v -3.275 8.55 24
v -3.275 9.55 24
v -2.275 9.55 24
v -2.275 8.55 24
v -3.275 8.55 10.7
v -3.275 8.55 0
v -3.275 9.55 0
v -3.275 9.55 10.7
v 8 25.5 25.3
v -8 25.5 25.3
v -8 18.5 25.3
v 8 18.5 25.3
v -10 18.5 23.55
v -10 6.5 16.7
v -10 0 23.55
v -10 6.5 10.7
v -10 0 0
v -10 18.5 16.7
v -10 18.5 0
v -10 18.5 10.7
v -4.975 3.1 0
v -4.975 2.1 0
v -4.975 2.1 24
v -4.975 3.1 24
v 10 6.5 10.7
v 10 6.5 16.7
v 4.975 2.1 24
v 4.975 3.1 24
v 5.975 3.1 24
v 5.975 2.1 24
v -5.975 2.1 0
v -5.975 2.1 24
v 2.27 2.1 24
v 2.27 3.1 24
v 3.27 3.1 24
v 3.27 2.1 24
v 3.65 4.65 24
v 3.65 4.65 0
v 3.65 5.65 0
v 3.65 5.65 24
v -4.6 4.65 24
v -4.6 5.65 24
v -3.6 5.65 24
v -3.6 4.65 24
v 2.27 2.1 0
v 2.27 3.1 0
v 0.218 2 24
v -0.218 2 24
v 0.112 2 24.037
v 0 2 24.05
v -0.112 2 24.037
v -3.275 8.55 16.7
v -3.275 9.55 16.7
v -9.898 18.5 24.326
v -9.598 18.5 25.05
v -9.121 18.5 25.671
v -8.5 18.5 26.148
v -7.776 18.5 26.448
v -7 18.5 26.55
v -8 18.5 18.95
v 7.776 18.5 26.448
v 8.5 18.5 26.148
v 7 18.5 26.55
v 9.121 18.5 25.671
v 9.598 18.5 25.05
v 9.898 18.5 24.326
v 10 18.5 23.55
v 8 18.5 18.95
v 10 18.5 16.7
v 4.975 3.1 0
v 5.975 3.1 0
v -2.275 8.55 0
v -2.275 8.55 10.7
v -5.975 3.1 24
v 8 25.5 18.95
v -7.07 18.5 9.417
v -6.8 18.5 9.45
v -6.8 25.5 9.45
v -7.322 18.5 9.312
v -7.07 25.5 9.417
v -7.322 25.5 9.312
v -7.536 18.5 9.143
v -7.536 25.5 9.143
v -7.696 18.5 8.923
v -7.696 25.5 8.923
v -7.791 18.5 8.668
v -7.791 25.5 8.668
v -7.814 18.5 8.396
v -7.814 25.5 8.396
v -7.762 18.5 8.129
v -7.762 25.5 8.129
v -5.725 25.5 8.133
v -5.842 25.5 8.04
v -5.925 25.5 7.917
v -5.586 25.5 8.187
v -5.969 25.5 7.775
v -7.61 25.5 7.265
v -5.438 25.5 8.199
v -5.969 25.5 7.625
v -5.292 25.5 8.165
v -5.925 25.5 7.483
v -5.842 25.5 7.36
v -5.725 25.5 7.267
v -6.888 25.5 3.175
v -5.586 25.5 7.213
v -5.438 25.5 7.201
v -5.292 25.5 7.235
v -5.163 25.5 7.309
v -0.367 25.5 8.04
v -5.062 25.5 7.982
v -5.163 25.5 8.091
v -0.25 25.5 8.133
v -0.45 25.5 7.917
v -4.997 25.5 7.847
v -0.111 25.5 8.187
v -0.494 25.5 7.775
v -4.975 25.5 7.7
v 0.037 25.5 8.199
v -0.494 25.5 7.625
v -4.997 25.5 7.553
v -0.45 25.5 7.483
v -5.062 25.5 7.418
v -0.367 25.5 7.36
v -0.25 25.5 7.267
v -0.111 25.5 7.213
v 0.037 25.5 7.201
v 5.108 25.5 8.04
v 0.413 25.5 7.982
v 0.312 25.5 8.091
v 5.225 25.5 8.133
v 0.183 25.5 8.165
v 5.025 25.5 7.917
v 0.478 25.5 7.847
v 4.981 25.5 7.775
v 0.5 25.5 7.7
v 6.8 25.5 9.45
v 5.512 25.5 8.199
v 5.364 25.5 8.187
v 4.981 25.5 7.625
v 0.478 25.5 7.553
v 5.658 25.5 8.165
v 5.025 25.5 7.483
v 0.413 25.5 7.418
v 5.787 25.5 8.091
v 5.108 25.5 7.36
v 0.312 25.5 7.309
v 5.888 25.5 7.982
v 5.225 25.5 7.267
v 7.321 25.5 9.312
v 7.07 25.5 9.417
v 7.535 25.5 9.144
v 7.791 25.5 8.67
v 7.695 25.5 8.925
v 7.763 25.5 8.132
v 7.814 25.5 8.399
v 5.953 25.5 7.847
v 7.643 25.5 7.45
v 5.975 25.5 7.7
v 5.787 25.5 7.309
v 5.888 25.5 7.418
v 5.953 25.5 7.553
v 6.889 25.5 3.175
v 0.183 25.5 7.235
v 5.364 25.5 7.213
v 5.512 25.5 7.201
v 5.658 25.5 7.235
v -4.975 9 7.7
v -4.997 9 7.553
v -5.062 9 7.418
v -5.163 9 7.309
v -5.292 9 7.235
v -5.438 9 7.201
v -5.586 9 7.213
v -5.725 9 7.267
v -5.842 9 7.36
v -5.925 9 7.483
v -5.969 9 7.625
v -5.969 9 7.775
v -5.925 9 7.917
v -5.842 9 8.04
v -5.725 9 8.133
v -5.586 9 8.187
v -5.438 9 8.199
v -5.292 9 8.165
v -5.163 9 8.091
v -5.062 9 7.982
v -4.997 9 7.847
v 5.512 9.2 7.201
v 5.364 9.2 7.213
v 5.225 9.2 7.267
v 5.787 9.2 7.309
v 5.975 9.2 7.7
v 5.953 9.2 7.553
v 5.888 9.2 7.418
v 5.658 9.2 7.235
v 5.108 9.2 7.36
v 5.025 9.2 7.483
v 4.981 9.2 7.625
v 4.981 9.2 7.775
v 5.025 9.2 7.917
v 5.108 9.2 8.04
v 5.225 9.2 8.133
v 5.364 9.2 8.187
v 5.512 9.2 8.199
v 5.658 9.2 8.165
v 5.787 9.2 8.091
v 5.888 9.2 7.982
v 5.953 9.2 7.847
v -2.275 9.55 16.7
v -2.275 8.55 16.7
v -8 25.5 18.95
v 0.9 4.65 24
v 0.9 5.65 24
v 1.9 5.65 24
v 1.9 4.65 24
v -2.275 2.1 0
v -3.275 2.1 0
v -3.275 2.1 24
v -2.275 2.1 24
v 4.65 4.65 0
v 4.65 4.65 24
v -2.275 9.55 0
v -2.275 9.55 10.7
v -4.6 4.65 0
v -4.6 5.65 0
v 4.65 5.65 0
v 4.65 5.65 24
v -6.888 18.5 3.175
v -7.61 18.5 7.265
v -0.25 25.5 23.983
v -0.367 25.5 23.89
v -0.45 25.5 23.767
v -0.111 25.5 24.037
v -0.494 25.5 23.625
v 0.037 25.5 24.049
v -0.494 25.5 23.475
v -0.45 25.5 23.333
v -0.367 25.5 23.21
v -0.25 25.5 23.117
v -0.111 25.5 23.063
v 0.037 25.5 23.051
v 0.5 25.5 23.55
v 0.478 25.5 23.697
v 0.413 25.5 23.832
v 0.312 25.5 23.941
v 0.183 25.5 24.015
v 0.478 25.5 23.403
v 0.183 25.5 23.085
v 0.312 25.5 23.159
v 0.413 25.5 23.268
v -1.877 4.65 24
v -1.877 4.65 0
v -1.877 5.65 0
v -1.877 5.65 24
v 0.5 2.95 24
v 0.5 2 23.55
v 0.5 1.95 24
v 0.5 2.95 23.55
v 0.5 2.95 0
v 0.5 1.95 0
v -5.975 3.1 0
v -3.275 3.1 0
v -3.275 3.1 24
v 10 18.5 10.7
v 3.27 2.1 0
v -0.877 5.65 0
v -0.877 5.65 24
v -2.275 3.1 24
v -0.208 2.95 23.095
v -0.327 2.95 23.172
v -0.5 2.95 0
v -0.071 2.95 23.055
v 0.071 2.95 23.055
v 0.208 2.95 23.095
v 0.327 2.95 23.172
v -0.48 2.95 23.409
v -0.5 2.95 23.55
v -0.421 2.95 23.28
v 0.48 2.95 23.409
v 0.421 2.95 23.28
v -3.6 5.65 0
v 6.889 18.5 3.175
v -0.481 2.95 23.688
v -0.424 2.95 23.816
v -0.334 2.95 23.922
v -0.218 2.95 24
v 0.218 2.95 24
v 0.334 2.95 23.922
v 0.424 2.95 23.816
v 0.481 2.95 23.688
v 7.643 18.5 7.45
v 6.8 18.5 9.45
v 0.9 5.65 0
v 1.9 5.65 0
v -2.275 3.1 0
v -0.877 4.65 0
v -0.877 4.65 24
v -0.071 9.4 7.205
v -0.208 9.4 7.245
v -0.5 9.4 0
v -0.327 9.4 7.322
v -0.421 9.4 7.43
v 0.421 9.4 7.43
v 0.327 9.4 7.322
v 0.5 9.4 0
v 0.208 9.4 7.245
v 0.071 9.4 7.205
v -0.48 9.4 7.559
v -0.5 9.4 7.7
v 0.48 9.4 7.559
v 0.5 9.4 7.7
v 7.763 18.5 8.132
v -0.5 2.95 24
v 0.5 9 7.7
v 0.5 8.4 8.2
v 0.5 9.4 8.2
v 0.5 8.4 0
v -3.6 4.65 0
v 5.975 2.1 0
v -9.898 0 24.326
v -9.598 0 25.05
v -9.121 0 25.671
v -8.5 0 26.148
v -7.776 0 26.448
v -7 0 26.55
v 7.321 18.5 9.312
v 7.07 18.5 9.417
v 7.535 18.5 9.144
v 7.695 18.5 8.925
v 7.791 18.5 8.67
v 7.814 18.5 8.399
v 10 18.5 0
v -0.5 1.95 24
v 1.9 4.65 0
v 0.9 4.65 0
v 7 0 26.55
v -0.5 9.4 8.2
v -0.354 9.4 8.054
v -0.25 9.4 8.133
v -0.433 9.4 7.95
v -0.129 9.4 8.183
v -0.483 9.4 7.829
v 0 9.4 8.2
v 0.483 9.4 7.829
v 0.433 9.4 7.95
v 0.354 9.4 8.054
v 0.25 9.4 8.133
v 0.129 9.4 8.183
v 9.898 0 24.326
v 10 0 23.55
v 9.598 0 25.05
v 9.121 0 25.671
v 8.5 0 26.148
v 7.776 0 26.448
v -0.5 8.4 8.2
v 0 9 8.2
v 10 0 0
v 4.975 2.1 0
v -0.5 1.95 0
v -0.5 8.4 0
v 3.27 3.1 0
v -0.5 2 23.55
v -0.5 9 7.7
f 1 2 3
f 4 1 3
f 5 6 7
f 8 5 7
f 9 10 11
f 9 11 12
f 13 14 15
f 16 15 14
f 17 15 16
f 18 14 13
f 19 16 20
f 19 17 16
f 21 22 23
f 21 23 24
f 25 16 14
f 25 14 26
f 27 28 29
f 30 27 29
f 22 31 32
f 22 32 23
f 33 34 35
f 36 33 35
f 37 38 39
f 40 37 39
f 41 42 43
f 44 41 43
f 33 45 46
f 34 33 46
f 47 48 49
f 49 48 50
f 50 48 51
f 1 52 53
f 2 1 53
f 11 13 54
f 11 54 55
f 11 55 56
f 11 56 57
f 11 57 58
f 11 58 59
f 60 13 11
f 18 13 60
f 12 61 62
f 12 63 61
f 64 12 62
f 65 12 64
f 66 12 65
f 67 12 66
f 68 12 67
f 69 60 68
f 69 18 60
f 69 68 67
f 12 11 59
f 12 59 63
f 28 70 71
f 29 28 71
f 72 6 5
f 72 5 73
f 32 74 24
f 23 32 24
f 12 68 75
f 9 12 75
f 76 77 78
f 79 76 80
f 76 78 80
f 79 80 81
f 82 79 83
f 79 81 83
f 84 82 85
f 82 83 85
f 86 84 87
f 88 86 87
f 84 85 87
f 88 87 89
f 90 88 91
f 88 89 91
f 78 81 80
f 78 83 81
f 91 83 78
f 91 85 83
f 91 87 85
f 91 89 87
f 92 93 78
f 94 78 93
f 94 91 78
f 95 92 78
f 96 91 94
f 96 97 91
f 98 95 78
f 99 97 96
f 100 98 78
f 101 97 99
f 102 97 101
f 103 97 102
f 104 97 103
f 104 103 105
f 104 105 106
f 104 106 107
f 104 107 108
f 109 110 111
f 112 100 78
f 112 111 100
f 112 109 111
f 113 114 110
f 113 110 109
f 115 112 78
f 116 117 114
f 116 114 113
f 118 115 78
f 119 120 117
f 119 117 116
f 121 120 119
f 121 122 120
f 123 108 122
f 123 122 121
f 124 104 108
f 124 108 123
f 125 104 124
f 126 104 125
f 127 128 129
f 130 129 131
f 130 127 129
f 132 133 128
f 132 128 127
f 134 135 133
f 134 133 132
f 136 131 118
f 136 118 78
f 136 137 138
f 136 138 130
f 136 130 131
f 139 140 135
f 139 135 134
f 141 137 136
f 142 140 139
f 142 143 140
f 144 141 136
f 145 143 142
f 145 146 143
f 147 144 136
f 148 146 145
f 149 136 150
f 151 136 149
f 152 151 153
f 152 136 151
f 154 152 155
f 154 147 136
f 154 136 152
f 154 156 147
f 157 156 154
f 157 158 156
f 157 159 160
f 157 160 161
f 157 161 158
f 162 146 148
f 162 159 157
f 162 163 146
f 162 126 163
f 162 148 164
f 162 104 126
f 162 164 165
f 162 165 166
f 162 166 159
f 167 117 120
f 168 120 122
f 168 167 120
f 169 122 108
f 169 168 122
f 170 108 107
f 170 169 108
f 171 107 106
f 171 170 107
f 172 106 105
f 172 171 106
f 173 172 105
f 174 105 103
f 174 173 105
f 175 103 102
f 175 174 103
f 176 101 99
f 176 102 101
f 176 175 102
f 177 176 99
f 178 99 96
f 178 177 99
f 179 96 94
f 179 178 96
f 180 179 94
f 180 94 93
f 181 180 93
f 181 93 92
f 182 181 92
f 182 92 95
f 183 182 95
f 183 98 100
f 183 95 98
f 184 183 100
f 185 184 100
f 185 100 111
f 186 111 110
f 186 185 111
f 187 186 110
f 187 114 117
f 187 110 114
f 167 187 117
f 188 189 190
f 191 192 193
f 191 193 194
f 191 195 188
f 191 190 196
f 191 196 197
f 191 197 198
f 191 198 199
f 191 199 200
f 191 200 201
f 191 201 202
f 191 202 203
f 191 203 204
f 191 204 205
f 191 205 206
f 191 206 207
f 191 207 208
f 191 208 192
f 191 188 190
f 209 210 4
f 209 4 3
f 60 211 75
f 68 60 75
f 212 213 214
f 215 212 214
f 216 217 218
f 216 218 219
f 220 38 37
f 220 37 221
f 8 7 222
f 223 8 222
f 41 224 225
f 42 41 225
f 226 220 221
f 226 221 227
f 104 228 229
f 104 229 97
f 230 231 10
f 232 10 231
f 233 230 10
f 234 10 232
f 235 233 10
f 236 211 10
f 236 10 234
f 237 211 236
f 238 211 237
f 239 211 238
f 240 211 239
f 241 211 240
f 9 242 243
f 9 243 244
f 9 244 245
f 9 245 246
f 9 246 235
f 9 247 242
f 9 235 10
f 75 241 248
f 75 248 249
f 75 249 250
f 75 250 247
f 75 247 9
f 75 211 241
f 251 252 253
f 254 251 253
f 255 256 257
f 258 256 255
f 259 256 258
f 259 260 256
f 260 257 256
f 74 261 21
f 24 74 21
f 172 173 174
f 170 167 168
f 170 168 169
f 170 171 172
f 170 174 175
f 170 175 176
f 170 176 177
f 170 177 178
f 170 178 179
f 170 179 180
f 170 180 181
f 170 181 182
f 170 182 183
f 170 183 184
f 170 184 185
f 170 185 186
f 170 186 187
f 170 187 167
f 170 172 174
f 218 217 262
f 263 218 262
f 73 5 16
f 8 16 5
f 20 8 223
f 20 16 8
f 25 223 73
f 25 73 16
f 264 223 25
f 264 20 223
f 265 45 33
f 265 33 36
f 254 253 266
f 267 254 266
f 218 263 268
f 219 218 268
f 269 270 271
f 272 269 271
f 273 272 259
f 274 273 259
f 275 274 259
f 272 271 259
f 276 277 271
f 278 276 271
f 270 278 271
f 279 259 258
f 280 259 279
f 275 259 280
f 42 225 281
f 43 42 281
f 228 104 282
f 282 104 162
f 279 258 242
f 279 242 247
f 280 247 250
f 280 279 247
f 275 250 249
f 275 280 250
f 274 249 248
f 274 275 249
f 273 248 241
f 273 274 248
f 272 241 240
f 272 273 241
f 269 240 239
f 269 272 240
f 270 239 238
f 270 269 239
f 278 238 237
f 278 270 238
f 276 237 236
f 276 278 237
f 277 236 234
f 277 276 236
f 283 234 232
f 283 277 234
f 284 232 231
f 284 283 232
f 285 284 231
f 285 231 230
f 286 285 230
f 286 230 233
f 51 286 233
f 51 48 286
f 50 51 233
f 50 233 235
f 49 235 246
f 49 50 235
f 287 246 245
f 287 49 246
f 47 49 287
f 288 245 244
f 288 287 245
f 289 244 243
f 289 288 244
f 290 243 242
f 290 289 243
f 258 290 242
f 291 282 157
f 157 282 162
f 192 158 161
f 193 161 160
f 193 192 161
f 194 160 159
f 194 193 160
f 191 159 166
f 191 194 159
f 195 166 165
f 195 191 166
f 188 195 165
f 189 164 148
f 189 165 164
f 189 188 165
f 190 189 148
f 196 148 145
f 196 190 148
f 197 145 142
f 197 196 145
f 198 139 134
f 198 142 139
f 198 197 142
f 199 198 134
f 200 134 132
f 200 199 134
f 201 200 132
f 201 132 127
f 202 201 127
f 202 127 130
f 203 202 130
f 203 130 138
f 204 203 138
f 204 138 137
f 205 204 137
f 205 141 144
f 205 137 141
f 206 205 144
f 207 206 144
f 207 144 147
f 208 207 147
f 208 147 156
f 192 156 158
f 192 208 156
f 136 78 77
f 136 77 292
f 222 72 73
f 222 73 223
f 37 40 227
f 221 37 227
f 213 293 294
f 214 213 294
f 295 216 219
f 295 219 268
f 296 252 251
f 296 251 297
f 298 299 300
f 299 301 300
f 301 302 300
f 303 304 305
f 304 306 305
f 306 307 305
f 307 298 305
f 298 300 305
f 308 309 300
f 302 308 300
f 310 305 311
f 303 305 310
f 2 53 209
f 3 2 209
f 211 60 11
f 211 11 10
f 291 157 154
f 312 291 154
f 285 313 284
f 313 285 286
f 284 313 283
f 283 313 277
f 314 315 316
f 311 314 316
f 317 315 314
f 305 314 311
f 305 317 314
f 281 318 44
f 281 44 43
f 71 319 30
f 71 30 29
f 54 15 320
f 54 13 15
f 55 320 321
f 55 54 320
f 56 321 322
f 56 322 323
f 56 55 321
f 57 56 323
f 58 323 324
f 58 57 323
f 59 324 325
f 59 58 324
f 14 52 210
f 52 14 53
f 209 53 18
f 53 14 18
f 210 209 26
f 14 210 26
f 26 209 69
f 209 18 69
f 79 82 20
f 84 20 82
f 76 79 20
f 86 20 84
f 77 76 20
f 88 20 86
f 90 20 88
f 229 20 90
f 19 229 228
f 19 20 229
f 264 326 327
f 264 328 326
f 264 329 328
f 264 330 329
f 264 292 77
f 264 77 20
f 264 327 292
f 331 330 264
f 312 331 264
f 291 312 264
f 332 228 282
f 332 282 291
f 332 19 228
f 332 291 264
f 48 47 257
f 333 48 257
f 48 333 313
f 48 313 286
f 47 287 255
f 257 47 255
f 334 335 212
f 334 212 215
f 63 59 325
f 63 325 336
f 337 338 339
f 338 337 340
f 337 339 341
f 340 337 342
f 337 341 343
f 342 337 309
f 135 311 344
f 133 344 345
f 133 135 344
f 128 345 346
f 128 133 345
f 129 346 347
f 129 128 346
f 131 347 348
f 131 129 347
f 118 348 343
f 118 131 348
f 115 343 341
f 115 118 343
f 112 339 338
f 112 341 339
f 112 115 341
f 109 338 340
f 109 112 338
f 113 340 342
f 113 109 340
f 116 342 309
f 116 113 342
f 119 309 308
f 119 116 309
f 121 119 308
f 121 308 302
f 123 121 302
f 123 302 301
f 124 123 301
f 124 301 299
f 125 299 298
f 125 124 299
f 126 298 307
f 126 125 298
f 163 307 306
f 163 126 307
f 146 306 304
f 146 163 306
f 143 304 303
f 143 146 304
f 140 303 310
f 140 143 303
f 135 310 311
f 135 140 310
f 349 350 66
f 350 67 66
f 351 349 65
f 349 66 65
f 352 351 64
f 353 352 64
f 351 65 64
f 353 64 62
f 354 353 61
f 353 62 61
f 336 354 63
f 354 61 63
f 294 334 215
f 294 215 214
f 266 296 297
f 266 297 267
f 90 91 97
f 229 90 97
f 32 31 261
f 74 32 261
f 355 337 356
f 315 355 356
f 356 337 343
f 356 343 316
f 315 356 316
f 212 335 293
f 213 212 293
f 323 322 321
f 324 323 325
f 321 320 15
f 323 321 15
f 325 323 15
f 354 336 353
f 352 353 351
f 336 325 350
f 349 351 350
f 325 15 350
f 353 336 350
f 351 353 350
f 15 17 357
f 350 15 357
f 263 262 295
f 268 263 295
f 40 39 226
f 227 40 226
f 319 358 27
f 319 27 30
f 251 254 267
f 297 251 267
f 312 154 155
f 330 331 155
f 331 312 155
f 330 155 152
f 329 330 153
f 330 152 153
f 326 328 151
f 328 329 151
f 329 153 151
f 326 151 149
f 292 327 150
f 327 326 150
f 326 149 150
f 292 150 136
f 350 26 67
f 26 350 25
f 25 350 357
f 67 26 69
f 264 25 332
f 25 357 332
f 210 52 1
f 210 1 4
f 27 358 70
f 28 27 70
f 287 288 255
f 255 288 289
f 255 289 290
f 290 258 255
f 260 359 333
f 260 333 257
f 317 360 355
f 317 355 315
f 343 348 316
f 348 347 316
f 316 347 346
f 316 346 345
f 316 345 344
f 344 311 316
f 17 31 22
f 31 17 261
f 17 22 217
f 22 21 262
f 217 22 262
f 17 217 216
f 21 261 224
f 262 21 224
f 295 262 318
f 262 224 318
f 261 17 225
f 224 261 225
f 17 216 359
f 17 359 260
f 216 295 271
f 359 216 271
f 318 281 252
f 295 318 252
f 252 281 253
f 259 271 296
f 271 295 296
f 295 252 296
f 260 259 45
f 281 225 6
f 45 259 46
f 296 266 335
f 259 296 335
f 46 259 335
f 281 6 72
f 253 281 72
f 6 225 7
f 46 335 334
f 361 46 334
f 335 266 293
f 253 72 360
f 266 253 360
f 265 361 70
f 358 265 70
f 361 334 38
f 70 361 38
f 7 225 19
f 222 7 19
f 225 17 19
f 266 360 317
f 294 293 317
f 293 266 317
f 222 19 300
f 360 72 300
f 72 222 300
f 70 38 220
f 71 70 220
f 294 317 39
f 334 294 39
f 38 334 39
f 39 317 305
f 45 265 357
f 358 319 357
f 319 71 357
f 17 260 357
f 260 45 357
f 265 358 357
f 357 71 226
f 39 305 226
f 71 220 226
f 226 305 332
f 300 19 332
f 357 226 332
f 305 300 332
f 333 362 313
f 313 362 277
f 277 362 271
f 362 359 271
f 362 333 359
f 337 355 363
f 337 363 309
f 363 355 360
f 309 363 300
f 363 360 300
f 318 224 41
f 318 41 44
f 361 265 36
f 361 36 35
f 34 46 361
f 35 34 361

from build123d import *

# Parameters (mm, degrees)
BOX_W             = 20
BOX_H             = 25.5
BOX_DEPTH         = 28.42
BOX001_W          = 2
BOX001_H          = 7
BOX001_DEPTH      = 31.5
BOX002_W          = 2
BOX002_H          = 7.5
BOX002_DEPTH      = 31
BOX003_W          = 21
BOX003_H          = 19
BOX003_DEPTH      = 6
BOX008_W          = 18
BOX008_H          = 7
BOX008_DEPTH      = 9.5
BOX009_W          = 22
BOX009_H          = 7
BOX009_DEPTH      = 3.175
BOX010_W          = 23
BOX010_H          = 7
BOX010_DEPTH      = 3.2
BOX011_W          = 1
BOX011_H          = 1
BOX011_DEPTH      = 24
BOX012_W          = 1
BOX012_H          = 1
BOX012_DEPTH      = 24
BOX019_W          = 21
BOX019_H          = 20
BOX019_DEPTH      = 3
BOX020_W          = 1
BOX020_H          = 1
BOX020_DEPTH      = 8.2
BOX021_W          = 1
BOX021_H          = 1
BOX021_DEPTH      = 24
BOX022_W          = 1
BOX022_H          = 1
BOX022_DEPTH      = 24
CYLINDER_R        = 0.5
CYLINDER_DEPTH    = 19
CYLINDER001_R     = 0.5
CYLINDER001_DEPTH = 24
CYLINDER002_R     = 0.5
CYLINDER002_DEPTH = 17
CYLINDER003_R     = 0.5
CYLINDER003_DEPTH = 17
BOX023_W          = 1
BOX023_H          = 1
BOX023_DEPTH      = 24
BOX024_W          = 1
BOX024_H          = 1
BOX024_DEPTH      = 24
BOX025_W          = 1
BOX025_H          = 1
BOX025_DEPTH      = 24
BOX026_W          = 1
BOX026_H          = 1
BOX026_DEPTH      = 24
BOX027_W          = 1
BOX027_H          = 1
BOX027_DEPTH      = 24
BOX028_W          = 1
BOX028_H          = 1
BOX028_DEPTH      = 24
BOX029_W          = 2
BOX029_H          = 8
BOX029_DEPTH      = 8
BOX030_W          = 2
BOX030_H          = 8
BOX030_DEPTH      = 8
BOX033_W          = 2
BOX033_H          = 7
BOX033_DEPTH      = 2
BOX034_W          = 2
BOX034_H          = 7
BOX034_DEPTH      = 2
CYLINDER006_R     = 1
CYLINDER006_DEPTH = 7
BOX035_W          = 0.8
BOX035_H          = 7
BOX035_DEPTH      = 2
BOX036_W          = 1
BOX036_H          = 1
BOX036_DEPTH      = 7
CYLINDER007_R     = 1
CYLINDER007_DEPTH = 7
BOX037_W          = 0.8
BOX037_H          = 7
BOX037_DEPTH      = 2
BOX038_W          = 1
BOX038_H          = 1
BOX038_DEPTH      = 7
FILLET008_R       = 3


with BuildPart() as part:
    # Box → Box (join)
    with BuildSketch(Plane(origin=(-10, 0, 0), x_dir=(1, 0, 0), z_dir=(0, 0, 1))):
        with Locations((10, 12.75)):
            Rectangle(BOX_W, BOX_H)
    extrude(amount=BOX_DEPTH)

    # Box001 → Box001 (cut)
    with BuildSketch(Plane(origin=(-10, 18.5, 0), x_dir=(1, 0, 0), z_dir=(0, 0, 1))):
        with Locations((1, 3.5)):
            Rectangle(BOX001_W, BOX001_H)
    extrude(amount=BOX001_DEPTH, mode=Mode.SUBTRACT)

    # Box002 → Box002 (cut)
    with BuildSketch(Plane(origin=(8, 18.5, 0), x_dir=(1, 0, 0), z_dir=(0, 0, 1))):
        with Locations((1, 3.75)):
            Rectangle(BOX002_W, BOX002_H)
    extrude(amount=BOX002_DEPTH, mode=Mode.SUBTRACT)

    # Box003 → Box003 (cut)
    with BuildSketch(Plane(origin=(-10.5, 6.5, 10.7), x_dir=(1, 0, 0), z_dir=(0, 0, 1))):
        with Locations((10.5, 9.5)):
            Rectangle(BOX003_W, BOX003_H)
    extrude(amount=BOX003_DEPTH, mode=Mode.SUBTRACT)

    # Box008 → Box008 (cut)
    with BuildSketch(Plane(origin=(-9, 18.5, 9.45), x_dir=(1, 0, 0), z_dir=(0, 0, 1))):
        with Locations((9, 3.5)):
            Rectangle(BOX008_W, BOX008_H)
    extrude(amount=BOX008_DEPTH, mode=Mode.SUBTRACT)

    # Box009 → Box009 (cut)
    with BuildSketch(Plane(origin=(-11, 18.5, 0), x_dir=(1, 0, 0), z_dir=(0, 0, 1))):
        with Locations((11, 3.5)):
            Rectangle(BOX009_W, BOX009_H)
    extrude(amount=BOX009_DEPTH, mode=Mode.SUBTRACT)

    # Box010 → Box010 (cut)
    with BuildSketch(Plane(origin=(-11.5, 18.5, 25.3), x_dir=(1, 0, 0), z_dir=(0, 0, 1))):
        with Locations((11.5, 3.5)):
            Rectangle(BOX010_W, BOX010_H)
    extrude(amount=BOX010_DEPTH, mode=Mode.SUBTRACT)

    # Box011 → Box011 (cut)
    with BuildSketch(Plane(origin=(-0.5, 1.95, 0), x_dir=(1, 0, 0), z_dir=(0, 0, 1))):
        with Locations((0.5, 0.5)):
            Rectangle(BOX011_W, BOX011_H)
    extrude(amount=BOX011_DEPTH, mode=Mode.SUBTRACT)

    # Box012 → Box012 (cut)
    with BuildSketch(Plane(origin=(2.27, 2.1, 0), x_dir=(1, 0, 0), z_dir=(0, 0, 1))):
        with Locations((0.5, 0.5)):
            Rectangle(BOX012_W, BOX012_H)
    extrude(amount=BOX012_DEPTH, mode=Mode.SUBTRACT)

    # Box019 → Box019 (cut)
    with BuildSketch(Plane(origin=(-10.5, 0, 26.55), x_dir=(1, 0, 0), z_dir=(0, 0, 1))):
        with Locations((10.5, 10)):
            Rectangle(BOX019_W, BOX019_H)
    extrude(amount=BOX019_DEPTH, mode=Mode.SUBTRACT)

    # Box020 → Box020 (cut)
    with BuildSketch(Plane(origin=(-0.5, 8.4, 0), x_dir=(1, 0, 0), z_dir=(0, 0, 1))):
        with Locations((0.5, 0.5)):
            Rectangle(BOX020_W, BOX020_H)
    extrude(amount=BOX020_DEPTH, mode=Mode.SUBTRACT)

    # Box021 → Box021 (cut)
    with BuildSketch(Plane(origin=(4.975, 2.1, 0), x_dir=(1, 0, 0), z_dir=(0, 0, 1))):
        with Locations((0.5, 0.5)):
            Rectangle(BOX021_W, BOX021_H)
    extrude(amount=BOX021_DEPTH, mode=Mode.SUBTRACT)

    # Box022 → Box022 (cut)
    with BuildSketch(Plane(origin=(-5.975, 2.1, 0), x_dir=(1, 0, 0), z_dir=(0, 0, 1))):
        with Locations((0.5, 0.5)):
            Rectangle(BOX022_W, BOX022_H)
    extrude(amount=BOX022_DEPTH, mode=Mode.SUBTRACT)

    # Cylinder → Cylinder (cut)
    with BuildSketch(Plane(origin=(0, 28, 7.7), x_dir=(1, 0, 0), z_dir=(0, -1, 0))):
        Circle(CYLINDER_R)
    extrude(amount=CYLINDER_DEPTH, mode=Mode.SUBTRACT)

    # Cylinder001 → Cylinder001 (cut)
    with BuildSketch(Plane(origin=(0, 2, 23.55), x_dir=(1, 0, 0), z_dir=(0, 1, 0))):
        Circle(CYLINDER001_R)
    extrude(amount=CYLINDER001_DEPTH, mode=Mode.SUBTRACT)

    # Cylinder002 → Cylinder002 (cut)
    with BuildSketch(Plane(origin=(5.475, 9.2, 7.7), x_dir=(1, 0, 0), z_dir=(0, 1, 0))):
        Circle(CYLINDER002_R)
    extrude(amount=CYLINDER002_DEPTH, mode=Mode.SUBTRACT)

    # Cylinder003 → Cylinder003 (cut)
    with BuildSketch(Plane(origin=(-5.475, 9, 7.7), x_dir=(1, 0, 0), z_dir=(0, 1, 0))):
        Circle(CYLINDER003_R)
    extrude(amount=CYLINDER003_DEPTH, mode=Mode.SUBTRACT)

    # Box023 → Box023 (cut)
    with BuildSketch(Plane(origin=(-3.275, 2.1, 0), x_dir=(1, 0, 0), z_dir=(0, 0, 1))):
        with Locations((0.5, 0.5)):
            Rectangle(BOX023_W, BOX023_H)
    extrude(amount=BOX023_DEPTH, mode=Mode.SUBTRACT)

    # Box024 → Box024 (cut)
    with BuildSketch(Plane(origin=(-3.275, 8.55, 0), x_dir=(1, 0, 0), z_dir=(0, 0, 1))):
        with Locations((0.5, 0.5)):
            Rectangle(BOX024_W, BOX024_H)
    extrude(amount=BOX024_DEPTH, mode=Mode.SUBTRACT)

    # Box025 → Box025 (cut)
    with BuildSketch(Plane(origin=(0.9, 4.65, 0), x_dir=(1, 0, 0), z_dir=(0, 0, 1))):
        with Locations((0.5, 0.5)):
            Rectangle(BOX025_W, BOX025_H)
    extrude(amount=BOX025_DEPTH, mode=Mode.SUBTRACT)

    # Box026 → Box026 (cut)
    with BuildSketch(Plane(origin=(-1.877, 4.65, 0), x_dir=(1, 0, 0), z_dir=(0, 0, 1))):
        with Locations((0.5, 0.5)):
            Rectangle(BOX026_W, BOX026_H)
    extrude(amount=BOX026_DEPTH, mode=Mode.SUBTRACT)

    # Box027 → Box027 (cut)
    with BuildSketch(Plane(origin=(3.65, 4.65, 0), x_dir=(1, 0, 0), z_dir=(0, 0, 1))):
        with Locations((0.5, 0.5)):
            Rectangle(BOX027_W, BOX027_H)
    extrude(amount=BOX027_DEPTH, mode=Mode.SUBTRACT)

    # Box028 → Box028 (cut)
    with BuildSketch(Plane(origin=(-4.6, 4.65, 0), x_dir=(1, 0, 0), z_dir=(0, 0, 1))):
        with Locations((0.5, 0.5)):
            Rectangle(BOX028_W, BOX028_H)
    extrude(amount=BOX028_DEPTH, mode=Mode.SUBTRACT)

    # Box029 → Box029 (cut)
    with BuildSketch(Plane(origin=(6.735, 18.5, 2.3), x_dir=(0.984808, 0, -0.173648), z_dir=(0.173648, 0, 0.984808))):
        with Locations((1, 4)):
            Rectangle(BOX029_W, BOX029_H)
    extrude(amount=BOX029_DEPTH, mode=Mode.SUBTRACT)

    # Box030 → Box030 (cut)
    with BuildSketch(Plane(origin=(-8.765, 18.5, 2.3), x_dir=(0.984808, 0, 0.173648), z_dir=(-0.173648, 0, 0.984808))):
        with Locations((1, 4)):
            Rectangle(BOX030_W, BOX030_H)
    extrude(amount=BOX030_DEPTH, mode=Mode.SUBTRACT)

    # Box033 → Box033 (cut)
    with BuildSketch(Plane(origin=(-8, 18.5, 7.45), x_dir=(1, 0, 0), z_dir=(0, 0, 1))):
        with Locations((1, 3.5)):
            Rectangle(BOX033_W, BOX033_H)
    extrude(amount=BOX033_DEPTH, mode=Mode.SUBTRACT)

    # Box034 → Box034 (cut)
    with BuildSketch(Plane(origin=(6, 18.5, 7.45), x_dir=(1, 0, 0), z_dir=(0, 0, 1))):
        with Locations((1, 3.5)):
            Rectangle(BOX034_W, BOX034_H)
    extrude(amount=BOX034_DEPTH, mode=Mode.SUBTRACT)

    # Cylinder006 → Cylinder006 (join)
    with BuildSketch(Plane(origin=(6.815, 25.5, 8.45), x_dir=(1, 0, 0), z_dir=(0, -1, 0))):
        Circle(CYLINDER006_R)
    extrude(amount=CYLINDER006_DEPTH)

    # Box035 → Box035 (join)
    with BuildSketch(Plane(origin=(6, 18.5, 7.45), x_dir=(1, 0, 0), z_dir=(0, 0, 1))):
        with Locations((0.4, 3.5)):
            Rectangle(BOX035_W, BOX035_H)
    extrude(amount=BOX035_DEPTH)

    # Box036 → Box036 (join)
    with BuildSketch(Plane(origin=(7.6075, 25.5, 7.25), x_dir=(0.173648, 0, 0.984808), z_dir=(0, -1, 0))):
        with Locations((0.5, 0.5)):
            Rectangle(BOX036_W, BOX036_H)
    extrude(amount=BOX036_DEPTH)

    # Cylinder007 → Cylinder007 (join)
    with BuildSketch(Plane(origin=(-6.815, 25.5, 8.45), x_dir=(1, 0, 0), z_dir=(0, -1, 0))):
        Circle(CYLINDER007_R)
    extrude(amount=CYLINDER007_DEPTH)

    # Box037 → Box037 (join)
    with BuildSketch(Plane(origin=(-6.8, 18.5, 7.45), x_dir=(1, 0, 0), z_dir=(0, 0, 1))):
        with Locations((0.4, 3.5)):
            Rectangle(BOX037_W, BOX037_H)
    extrude(amount=BOX037_DEPTH)

    # Box038 → Box038 (join)
    with BuildSketch(Plane(origin=(-7.7834, 25.5, 8.25), x_dir=(0.173648, 0, -0.984808), z_dir=(0, -1, 0))):
        with Locations((0.5, 0.5)):
            Rectangle(BOX038_W, BOX038_H)
    extrude(amount=BOX038_DEPTH)

    # Fillet008
    fillet008_edges = [part.edges().sort_by_distance(p)[0] for p in [
        (10, 9.25, 26.55),
        (-10, 9.25, 26.55),
    ]]
    fillet(fillet008_edges, radius=FILLET008_R)


solid = part.part
